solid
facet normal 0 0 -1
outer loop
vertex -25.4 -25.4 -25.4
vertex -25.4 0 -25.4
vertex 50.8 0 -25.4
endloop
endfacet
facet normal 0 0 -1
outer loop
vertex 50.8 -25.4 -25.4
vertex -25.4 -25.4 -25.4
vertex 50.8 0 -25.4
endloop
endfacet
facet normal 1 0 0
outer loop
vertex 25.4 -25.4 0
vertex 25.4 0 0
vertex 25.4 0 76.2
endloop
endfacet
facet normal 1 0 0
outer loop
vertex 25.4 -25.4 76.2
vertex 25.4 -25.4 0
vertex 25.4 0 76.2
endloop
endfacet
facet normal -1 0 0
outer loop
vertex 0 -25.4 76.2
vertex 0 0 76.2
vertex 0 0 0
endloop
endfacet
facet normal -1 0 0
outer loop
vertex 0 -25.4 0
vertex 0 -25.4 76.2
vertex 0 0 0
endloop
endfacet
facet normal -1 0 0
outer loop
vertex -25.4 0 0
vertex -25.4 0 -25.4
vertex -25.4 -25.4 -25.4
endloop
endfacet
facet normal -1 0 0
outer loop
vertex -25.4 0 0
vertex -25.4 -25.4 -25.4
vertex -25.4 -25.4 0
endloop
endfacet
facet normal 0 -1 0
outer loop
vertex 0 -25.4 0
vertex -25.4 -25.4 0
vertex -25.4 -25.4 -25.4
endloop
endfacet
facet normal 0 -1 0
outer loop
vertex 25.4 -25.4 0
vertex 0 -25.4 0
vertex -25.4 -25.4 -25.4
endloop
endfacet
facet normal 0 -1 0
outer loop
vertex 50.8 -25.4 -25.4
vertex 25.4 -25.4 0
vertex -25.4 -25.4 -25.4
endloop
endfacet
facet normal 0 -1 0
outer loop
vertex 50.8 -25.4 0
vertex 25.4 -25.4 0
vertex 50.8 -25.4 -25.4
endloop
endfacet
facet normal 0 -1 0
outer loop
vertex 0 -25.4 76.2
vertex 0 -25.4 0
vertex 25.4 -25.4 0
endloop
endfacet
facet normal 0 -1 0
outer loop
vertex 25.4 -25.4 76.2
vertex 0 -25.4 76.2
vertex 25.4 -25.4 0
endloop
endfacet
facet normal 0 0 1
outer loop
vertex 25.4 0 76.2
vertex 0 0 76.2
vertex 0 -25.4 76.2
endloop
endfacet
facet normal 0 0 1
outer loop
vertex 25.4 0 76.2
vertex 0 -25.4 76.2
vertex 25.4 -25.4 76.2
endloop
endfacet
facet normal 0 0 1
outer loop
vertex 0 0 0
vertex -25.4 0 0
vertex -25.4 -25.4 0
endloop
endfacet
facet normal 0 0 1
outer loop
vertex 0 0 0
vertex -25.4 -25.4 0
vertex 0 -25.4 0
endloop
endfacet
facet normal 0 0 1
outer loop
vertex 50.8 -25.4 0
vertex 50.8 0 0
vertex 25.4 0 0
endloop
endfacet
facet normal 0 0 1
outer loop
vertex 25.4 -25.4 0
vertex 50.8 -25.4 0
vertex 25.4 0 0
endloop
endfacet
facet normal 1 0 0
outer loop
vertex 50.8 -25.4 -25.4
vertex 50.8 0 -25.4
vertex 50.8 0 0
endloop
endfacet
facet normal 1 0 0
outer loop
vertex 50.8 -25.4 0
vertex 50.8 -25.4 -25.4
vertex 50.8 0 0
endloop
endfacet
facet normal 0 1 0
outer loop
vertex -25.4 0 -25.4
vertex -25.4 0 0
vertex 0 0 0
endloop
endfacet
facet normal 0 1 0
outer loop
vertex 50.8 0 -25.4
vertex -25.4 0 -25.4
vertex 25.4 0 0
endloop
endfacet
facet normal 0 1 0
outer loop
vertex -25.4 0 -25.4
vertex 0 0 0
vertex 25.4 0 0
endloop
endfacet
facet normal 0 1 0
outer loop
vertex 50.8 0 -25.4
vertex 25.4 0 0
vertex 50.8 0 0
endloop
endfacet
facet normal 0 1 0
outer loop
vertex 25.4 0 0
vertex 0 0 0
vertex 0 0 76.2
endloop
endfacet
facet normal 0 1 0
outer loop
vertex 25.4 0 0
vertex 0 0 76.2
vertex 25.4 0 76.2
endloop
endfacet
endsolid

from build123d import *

# Parameters (mm, degrees)
F0_W     = 25.4
F0_H     = 25.4
F1_DEPTH = 25.4
F2_W     = 25.4
F2_H     = 76.2
F3_DEPTH = 25.4


with BuildPart() as f1:
    # F0 (on Front) → F1 (new body)
    with BuildSketch(Plane.XZ):
        with Locations((-12.7, -12.7)):
            Rectangle(F0_W, F0_H)
    extrude(amount=F1_DEPTH)

    # F2 (on Front) → F3 (join)
    with BuildSketch(Plane.XZ):
        Polygon((25.4, 0), (0, 0), (0, -25.4), (25.4, -25.4), (50.8, -25.4), (50.8, 0), align=None)
        with Locations((12.7, 38.1)):
            Rectangle(F2_W, F2_H)
    extrude(amount=F3_DEPTH)


solid = f1.part
